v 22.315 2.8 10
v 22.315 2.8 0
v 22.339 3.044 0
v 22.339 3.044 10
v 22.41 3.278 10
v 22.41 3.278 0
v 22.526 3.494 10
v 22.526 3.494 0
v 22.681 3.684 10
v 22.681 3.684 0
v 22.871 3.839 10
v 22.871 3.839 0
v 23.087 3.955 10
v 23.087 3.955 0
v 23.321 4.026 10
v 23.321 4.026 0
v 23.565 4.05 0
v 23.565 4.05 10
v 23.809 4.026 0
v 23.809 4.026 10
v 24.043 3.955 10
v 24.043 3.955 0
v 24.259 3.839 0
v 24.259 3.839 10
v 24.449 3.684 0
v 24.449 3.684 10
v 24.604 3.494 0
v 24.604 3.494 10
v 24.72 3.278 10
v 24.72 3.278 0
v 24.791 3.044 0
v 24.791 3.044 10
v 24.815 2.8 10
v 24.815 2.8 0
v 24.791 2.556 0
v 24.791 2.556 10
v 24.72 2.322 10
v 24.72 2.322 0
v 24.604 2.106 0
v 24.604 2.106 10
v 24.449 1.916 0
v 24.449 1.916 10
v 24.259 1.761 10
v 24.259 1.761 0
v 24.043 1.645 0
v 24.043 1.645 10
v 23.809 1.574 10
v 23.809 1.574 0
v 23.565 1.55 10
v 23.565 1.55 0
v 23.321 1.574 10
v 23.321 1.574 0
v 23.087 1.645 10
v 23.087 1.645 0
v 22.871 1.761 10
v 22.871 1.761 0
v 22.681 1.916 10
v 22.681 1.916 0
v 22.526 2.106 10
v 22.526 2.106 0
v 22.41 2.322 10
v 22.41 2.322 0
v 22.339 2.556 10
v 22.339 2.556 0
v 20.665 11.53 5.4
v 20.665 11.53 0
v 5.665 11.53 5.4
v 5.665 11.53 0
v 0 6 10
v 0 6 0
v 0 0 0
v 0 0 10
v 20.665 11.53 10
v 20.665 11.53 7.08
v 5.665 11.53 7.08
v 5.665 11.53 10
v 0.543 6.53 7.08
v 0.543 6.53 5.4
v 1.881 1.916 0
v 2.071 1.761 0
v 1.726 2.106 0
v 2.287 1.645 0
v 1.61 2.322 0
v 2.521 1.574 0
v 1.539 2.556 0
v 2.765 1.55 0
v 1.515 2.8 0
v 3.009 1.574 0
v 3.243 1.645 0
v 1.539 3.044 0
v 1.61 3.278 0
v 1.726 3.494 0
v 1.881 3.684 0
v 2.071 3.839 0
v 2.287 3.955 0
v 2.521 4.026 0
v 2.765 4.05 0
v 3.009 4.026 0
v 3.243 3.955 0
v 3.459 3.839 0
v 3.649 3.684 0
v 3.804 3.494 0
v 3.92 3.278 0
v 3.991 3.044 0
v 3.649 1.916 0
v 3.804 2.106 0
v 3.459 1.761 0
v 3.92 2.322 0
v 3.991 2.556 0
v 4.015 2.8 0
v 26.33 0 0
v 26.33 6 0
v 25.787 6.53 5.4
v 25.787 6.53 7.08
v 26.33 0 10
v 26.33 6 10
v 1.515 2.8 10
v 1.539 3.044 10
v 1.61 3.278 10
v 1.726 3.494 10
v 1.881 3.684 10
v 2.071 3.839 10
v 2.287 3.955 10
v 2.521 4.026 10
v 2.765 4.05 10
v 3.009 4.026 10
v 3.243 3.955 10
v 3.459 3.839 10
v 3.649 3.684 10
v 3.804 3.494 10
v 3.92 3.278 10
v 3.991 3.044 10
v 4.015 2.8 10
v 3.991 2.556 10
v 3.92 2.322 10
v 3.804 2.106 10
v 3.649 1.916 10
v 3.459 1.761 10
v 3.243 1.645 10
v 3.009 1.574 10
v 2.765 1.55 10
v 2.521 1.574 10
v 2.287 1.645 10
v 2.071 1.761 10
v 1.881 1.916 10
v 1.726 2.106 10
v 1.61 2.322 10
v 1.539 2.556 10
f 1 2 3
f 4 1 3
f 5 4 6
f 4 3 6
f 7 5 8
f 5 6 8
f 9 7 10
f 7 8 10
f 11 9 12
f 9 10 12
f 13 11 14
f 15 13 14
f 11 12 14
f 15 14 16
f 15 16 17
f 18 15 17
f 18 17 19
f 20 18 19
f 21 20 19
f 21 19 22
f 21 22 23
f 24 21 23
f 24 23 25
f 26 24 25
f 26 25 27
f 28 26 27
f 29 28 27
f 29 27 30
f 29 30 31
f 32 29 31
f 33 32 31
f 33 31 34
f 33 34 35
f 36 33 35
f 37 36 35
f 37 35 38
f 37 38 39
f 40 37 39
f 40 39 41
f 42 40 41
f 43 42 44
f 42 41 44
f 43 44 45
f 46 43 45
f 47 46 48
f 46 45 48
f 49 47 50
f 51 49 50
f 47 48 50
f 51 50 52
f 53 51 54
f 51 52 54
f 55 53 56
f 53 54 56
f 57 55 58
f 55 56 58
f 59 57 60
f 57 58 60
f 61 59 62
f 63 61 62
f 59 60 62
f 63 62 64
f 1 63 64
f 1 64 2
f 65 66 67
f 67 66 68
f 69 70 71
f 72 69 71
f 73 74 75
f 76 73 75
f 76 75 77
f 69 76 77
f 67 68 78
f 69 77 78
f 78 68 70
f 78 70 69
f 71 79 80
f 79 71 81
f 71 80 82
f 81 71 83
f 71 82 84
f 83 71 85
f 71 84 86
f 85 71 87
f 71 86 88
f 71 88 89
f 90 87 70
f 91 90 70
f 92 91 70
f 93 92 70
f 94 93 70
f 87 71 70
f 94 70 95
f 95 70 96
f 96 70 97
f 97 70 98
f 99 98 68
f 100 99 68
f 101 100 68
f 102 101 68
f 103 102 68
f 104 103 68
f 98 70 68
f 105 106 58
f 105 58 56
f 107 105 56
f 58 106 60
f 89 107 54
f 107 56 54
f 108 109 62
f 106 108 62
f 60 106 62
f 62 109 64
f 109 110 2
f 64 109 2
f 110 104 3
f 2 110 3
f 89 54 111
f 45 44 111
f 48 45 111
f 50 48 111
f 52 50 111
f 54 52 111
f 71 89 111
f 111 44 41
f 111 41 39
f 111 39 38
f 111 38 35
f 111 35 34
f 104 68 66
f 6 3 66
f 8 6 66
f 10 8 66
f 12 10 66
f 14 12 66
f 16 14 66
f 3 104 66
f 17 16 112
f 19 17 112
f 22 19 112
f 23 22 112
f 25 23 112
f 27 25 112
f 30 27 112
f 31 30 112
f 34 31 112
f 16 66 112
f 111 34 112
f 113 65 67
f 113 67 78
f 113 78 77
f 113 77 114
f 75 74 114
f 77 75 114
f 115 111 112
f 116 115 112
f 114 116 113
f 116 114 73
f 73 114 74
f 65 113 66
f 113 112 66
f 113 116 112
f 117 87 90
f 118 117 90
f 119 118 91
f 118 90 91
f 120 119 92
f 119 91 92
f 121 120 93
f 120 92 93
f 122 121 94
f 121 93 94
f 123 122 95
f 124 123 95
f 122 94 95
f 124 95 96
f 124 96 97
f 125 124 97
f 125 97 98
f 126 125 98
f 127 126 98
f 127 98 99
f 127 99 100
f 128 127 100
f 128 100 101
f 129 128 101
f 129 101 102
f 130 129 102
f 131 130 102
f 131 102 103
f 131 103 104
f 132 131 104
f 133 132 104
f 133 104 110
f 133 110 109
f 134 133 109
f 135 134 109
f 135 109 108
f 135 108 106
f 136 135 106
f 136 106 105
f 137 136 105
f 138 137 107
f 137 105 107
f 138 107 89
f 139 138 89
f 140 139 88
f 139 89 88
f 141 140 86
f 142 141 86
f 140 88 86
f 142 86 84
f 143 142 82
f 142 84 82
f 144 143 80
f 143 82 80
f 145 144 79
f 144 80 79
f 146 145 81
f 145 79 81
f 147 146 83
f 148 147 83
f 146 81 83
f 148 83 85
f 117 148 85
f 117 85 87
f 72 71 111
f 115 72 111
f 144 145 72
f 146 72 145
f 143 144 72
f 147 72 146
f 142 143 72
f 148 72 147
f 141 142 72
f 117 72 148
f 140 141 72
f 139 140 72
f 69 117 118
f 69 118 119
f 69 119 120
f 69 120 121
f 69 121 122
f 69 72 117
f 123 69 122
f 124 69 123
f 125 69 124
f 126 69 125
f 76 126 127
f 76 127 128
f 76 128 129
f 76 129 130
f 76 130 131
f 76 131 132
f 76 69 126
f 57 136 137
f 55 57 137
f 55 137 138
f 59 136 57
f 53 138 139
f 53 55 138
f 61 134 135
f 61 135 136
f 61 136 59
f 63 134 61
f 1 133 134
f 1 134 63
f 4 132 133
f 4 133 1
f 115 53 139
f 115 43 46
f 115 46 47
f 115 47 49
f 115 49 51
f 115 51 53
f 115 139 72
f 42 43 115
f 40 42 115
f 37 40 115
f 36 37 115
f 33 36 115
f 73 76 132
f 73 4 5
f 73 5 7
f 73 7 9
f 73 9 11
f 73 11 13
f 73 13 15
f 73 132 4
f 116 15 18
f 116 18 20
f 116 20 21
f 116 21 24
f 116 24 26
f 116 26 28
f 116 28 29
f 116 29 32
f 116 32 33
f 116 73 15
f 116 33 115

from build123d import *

# Parameters (mm, degrees)
EXTRUDE_1_DEPTH     = 10
SKETCH_2_W          = 26.33
SKETCH_2_H          = 1.68
CUT_EXTRUDE_1_DEPTH = 5
CUT_EXTRUDE_2_REACH = 32.434
SKETCH_3_R          = 1.25


with BuildPart() as part:
    # 草图1 → 凸台-拉伸1 (new body)
    with BuildSketch(Plane.XY):
        Polygon((0, 0), (26.33, 0), (26.33, 6), (20.665, 11.53), (5.665, 11.53), (0, 6), align=None)
    extrude(amount=EXTRUDE_1_DEPTH)

    # 草图2 → 切除-拉伸1 (cut)
    with BuildSketch(Plane(origin=(0, 11.53, 0), x_dir=(1, 0, 0), z_dir=(0, 1, 0))):
        with Locations((13.165, -6.24)):
            Rectangle(SKETCH_2_W, SKETCH_2_H)
    extrude(amount=-CUT_EXTRUDE_1_DEPTH, mode=Mode.SUBTRACT)

    # 草图3 → 切除-拉伸2 (cut, up to next)
    with BuildSketch(Plane(origin=(0, 0, 0), x_dir=(-1, 0, 0), z_dir=(0, 0, -1)), mode=Mode.PRIVATE) as cut_extrude_2_sk1:
        with Locations((-23.565, 2.8)):
            Circle(SKETCH_3_R)
    cut_extrude_2_tool1 = extrude(cut_extrude_2_sk1.sketch, amount=-CUT_EXTRUDE_2_REACH, mode=Mode.PRIVATE) & part.part
    # 草图3 → 切除-拉伸2 (cut, up to next)
    with BuildSketch(Plane(origin=(0, 0, 0), x_dir=(-1, 0, 0), z_dir=(0, 0, -1)), mode=Mode.PRIVATE) as cut_extrude_2_sk2:
        with Locations((-2.765, 2.8)):
            Circle(SKETCH_3_R)
    cut_extrude_2_tool2 = extrude(cut_extrude_2_sk2.sketch, amount=-CUT_EXTRUDE_2_REACH, mode=Mode.PRIVATE) & part.part
    add(cut_extrude_2_tool1.solids().sort_by_distance((23.565, 2.8, 0))[0], mode=Mode.SUBTRACT)
    add(cut_extrude_2_tool2.solids().sort_by_distance((2.765, 2.8, 0))[0], mode=Mode.SUBTRACT)


solid = part.part
